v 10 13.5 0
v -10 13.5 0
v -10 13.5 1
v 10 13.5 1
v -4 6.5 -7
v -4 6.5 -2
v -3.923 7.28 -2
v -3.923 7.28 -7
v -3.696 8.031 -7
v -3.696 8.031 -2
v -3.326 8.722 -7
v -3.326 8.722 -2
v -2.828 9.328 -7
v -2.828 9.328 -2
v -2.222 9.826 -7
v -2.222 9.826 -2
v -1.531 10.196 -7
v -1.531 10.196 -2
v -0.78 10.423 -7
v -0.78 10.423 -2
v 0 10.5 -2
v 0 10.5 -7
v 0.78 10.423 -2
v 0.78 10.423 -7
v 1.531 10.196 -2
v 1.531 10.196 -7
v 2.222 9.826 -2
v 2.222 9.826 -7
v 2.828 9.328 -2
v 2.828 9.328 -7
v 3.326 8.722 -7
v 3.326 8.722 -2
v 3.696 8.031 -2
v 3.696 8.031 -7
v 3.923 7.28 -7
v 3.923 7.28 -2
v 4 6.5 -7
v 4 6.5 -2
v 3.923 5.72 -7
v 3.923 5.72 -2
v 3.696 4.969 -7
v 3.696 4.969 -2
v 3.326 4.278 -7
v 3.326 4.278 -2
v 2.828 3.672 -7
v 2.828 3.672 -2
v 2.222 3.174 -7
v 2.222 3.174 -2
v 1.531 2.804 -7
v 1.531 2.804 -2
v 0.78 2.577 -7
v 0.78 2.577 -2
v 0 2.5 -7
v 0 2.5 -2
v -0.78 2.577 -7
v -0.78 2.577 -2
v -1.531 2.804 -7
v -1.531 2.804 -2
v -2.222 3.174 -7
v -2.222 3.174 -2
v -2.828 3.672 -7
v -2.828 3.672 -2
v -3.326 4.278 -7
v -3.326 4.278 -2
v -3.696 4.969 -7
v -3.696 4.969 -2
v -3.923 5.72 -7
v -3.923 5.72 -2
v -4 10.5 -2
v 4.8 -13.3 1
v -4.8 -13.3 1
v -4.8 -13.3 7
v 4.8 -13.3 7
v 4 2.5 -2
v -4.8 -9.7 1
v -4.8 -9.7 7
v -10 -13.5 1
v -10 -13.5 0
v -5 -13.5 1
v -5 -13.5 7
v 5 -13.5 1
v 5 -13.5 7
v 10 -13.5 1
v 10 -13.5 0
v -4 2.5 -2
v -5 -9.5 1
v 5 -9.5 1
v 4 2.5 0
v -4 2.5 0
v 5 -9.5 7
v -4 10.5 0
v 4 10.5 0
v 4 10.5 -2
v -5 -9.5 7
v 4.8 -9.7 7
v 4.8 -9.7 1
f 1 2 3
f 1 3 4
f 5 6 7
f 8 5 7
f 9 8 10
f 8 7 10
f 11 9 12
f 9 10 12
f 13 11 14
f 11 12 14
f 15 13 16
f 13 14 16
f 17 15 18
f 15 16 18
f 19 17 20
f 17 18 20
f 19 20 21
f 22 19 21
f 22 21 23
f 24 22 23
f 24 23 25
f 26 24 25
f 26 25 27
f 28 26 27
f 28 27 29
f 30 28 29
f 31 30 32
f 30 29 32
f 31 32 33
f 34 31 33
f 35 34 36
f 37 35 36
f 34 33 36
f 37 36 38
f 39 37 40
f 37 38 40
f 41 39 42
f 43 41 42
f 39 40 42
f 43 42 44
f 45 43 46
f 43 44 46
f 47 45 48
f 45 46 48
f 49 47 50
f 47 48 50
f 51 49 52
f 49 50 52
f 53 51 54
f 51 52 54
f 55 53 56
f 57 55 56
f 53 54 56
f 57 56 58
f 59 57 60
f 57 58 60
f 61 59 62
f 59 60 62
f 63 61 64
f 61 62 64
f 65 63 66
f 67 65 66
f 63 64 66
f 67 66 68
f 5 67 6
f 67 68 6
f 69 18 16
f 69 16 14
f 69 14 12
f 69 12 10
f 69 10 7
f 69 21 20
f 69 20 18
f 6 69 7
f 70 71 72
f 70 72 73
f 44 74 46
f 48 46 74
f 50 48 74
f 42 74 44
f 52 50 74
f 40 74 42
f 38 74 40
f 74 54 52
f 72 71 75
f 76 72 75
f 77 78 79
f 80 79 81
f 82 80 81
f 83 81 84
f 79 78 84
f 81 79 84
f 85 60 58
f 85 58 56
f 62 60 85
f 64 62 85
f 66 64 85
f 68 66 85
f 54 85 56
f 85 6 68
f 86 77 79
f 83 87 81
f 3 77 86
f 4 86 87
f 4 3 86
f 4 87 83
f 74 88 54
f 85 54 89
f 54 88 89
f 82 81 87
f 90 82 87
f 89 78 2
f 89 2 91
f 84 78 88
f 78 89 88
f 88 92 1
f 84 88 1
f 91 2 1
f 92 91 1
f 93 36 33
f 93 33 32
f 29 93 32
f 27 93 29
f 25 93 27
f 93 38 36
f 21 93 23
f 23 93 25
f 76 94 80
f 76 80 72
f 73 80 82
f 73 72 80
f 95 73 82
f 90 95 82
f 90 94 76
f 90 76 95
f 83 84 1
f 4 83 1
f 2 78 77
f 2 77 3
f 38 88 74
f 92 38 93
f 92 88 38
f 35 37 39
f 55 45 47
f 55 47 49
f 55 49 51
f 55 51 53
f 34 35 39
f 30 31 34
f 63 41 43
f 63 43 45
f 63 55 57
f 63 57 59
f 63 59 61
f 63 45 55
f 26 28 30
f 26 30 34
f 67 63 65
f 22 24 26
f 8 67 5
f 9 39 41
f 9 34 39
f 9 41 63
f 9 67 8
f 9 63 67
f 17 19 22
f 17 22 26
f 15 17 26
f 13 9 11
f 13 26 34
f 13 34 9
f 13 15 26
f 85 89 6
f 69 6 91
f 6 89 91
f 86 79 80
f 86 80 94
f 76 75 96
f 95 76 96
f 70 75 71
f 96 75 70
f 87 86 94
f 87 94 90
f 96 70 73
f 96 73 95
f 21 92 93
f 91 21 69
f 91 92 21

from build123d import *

# Parameters (mm, degrees)
SKETCH1_W           = 20
SKETCH1_H           = 27
BOSS_EXTRUDE1_DEPTH = 1
SKETCH2_W           = 8
SKETCH2_H           = 8
BOSS_EXTRUDE2_DEPTH = 2
SKETCH2_3_R         = 4
BOSS_EXTRUDE3_DEPTH = 7
SKETCH3_W           = 10
SKETCH3_H           = 4
SKETCH3_W_2         = 9.6
SKETCH3_H_2         = 3.6
EXTRUDE_THIN1_DEPTH = 6


with BuildPart() as part:
    # Sketch1 → Boss-Extrude1 (new body)
    with BuildSketch(Plane.XY):
        Rectangle(SKETCH1_W, SKETCH1_H)
    extrude(amount=BOSS_EXTRUDE1_DEPTH)

    # Sketch2 → Boss-Extrude2 (add)
    with BuildSketch(Plane(origin=(0, 0, 0), x_dir=(-1, 0, 0), z_dir=(0, 0, -1))):
        with Locations((0, 6.5)):
            Rectangle(SKETCH2_W, SKETCH2_H)
    extrude(amount=BOSS_EXTRUDE2_DEPTH)

    # Sketch2<3> → Boss-Extrude3 (add)
    with BuildSketch(Plane(origin=(0, 0, 0), x_dir=(-1, 0, 0), z_dir=(0, 0, -1))):
        with Locations((0, 6.5)):
            Circle(SKETCH2_3_R)
    extrude(amount=BOSS_EXTRUDE3_DEPTH)

    # Sketch3 → Extrude-Thin1 (add)
    with BuildSketch(Plane.XY.offset(1)):
        with Locations((0, -11.5)):
            Rectangle(SKETCH3_W, SKETCH3_H)
        with Locations((0, -11.5)):
            Rectangle(SKETCH3_W_2, SKETCH3_H_2, mode=Mode.SUBTRACT)
    extrude(amount=EXTRUDE_THIN1_DEPTH)


solid = part.part
